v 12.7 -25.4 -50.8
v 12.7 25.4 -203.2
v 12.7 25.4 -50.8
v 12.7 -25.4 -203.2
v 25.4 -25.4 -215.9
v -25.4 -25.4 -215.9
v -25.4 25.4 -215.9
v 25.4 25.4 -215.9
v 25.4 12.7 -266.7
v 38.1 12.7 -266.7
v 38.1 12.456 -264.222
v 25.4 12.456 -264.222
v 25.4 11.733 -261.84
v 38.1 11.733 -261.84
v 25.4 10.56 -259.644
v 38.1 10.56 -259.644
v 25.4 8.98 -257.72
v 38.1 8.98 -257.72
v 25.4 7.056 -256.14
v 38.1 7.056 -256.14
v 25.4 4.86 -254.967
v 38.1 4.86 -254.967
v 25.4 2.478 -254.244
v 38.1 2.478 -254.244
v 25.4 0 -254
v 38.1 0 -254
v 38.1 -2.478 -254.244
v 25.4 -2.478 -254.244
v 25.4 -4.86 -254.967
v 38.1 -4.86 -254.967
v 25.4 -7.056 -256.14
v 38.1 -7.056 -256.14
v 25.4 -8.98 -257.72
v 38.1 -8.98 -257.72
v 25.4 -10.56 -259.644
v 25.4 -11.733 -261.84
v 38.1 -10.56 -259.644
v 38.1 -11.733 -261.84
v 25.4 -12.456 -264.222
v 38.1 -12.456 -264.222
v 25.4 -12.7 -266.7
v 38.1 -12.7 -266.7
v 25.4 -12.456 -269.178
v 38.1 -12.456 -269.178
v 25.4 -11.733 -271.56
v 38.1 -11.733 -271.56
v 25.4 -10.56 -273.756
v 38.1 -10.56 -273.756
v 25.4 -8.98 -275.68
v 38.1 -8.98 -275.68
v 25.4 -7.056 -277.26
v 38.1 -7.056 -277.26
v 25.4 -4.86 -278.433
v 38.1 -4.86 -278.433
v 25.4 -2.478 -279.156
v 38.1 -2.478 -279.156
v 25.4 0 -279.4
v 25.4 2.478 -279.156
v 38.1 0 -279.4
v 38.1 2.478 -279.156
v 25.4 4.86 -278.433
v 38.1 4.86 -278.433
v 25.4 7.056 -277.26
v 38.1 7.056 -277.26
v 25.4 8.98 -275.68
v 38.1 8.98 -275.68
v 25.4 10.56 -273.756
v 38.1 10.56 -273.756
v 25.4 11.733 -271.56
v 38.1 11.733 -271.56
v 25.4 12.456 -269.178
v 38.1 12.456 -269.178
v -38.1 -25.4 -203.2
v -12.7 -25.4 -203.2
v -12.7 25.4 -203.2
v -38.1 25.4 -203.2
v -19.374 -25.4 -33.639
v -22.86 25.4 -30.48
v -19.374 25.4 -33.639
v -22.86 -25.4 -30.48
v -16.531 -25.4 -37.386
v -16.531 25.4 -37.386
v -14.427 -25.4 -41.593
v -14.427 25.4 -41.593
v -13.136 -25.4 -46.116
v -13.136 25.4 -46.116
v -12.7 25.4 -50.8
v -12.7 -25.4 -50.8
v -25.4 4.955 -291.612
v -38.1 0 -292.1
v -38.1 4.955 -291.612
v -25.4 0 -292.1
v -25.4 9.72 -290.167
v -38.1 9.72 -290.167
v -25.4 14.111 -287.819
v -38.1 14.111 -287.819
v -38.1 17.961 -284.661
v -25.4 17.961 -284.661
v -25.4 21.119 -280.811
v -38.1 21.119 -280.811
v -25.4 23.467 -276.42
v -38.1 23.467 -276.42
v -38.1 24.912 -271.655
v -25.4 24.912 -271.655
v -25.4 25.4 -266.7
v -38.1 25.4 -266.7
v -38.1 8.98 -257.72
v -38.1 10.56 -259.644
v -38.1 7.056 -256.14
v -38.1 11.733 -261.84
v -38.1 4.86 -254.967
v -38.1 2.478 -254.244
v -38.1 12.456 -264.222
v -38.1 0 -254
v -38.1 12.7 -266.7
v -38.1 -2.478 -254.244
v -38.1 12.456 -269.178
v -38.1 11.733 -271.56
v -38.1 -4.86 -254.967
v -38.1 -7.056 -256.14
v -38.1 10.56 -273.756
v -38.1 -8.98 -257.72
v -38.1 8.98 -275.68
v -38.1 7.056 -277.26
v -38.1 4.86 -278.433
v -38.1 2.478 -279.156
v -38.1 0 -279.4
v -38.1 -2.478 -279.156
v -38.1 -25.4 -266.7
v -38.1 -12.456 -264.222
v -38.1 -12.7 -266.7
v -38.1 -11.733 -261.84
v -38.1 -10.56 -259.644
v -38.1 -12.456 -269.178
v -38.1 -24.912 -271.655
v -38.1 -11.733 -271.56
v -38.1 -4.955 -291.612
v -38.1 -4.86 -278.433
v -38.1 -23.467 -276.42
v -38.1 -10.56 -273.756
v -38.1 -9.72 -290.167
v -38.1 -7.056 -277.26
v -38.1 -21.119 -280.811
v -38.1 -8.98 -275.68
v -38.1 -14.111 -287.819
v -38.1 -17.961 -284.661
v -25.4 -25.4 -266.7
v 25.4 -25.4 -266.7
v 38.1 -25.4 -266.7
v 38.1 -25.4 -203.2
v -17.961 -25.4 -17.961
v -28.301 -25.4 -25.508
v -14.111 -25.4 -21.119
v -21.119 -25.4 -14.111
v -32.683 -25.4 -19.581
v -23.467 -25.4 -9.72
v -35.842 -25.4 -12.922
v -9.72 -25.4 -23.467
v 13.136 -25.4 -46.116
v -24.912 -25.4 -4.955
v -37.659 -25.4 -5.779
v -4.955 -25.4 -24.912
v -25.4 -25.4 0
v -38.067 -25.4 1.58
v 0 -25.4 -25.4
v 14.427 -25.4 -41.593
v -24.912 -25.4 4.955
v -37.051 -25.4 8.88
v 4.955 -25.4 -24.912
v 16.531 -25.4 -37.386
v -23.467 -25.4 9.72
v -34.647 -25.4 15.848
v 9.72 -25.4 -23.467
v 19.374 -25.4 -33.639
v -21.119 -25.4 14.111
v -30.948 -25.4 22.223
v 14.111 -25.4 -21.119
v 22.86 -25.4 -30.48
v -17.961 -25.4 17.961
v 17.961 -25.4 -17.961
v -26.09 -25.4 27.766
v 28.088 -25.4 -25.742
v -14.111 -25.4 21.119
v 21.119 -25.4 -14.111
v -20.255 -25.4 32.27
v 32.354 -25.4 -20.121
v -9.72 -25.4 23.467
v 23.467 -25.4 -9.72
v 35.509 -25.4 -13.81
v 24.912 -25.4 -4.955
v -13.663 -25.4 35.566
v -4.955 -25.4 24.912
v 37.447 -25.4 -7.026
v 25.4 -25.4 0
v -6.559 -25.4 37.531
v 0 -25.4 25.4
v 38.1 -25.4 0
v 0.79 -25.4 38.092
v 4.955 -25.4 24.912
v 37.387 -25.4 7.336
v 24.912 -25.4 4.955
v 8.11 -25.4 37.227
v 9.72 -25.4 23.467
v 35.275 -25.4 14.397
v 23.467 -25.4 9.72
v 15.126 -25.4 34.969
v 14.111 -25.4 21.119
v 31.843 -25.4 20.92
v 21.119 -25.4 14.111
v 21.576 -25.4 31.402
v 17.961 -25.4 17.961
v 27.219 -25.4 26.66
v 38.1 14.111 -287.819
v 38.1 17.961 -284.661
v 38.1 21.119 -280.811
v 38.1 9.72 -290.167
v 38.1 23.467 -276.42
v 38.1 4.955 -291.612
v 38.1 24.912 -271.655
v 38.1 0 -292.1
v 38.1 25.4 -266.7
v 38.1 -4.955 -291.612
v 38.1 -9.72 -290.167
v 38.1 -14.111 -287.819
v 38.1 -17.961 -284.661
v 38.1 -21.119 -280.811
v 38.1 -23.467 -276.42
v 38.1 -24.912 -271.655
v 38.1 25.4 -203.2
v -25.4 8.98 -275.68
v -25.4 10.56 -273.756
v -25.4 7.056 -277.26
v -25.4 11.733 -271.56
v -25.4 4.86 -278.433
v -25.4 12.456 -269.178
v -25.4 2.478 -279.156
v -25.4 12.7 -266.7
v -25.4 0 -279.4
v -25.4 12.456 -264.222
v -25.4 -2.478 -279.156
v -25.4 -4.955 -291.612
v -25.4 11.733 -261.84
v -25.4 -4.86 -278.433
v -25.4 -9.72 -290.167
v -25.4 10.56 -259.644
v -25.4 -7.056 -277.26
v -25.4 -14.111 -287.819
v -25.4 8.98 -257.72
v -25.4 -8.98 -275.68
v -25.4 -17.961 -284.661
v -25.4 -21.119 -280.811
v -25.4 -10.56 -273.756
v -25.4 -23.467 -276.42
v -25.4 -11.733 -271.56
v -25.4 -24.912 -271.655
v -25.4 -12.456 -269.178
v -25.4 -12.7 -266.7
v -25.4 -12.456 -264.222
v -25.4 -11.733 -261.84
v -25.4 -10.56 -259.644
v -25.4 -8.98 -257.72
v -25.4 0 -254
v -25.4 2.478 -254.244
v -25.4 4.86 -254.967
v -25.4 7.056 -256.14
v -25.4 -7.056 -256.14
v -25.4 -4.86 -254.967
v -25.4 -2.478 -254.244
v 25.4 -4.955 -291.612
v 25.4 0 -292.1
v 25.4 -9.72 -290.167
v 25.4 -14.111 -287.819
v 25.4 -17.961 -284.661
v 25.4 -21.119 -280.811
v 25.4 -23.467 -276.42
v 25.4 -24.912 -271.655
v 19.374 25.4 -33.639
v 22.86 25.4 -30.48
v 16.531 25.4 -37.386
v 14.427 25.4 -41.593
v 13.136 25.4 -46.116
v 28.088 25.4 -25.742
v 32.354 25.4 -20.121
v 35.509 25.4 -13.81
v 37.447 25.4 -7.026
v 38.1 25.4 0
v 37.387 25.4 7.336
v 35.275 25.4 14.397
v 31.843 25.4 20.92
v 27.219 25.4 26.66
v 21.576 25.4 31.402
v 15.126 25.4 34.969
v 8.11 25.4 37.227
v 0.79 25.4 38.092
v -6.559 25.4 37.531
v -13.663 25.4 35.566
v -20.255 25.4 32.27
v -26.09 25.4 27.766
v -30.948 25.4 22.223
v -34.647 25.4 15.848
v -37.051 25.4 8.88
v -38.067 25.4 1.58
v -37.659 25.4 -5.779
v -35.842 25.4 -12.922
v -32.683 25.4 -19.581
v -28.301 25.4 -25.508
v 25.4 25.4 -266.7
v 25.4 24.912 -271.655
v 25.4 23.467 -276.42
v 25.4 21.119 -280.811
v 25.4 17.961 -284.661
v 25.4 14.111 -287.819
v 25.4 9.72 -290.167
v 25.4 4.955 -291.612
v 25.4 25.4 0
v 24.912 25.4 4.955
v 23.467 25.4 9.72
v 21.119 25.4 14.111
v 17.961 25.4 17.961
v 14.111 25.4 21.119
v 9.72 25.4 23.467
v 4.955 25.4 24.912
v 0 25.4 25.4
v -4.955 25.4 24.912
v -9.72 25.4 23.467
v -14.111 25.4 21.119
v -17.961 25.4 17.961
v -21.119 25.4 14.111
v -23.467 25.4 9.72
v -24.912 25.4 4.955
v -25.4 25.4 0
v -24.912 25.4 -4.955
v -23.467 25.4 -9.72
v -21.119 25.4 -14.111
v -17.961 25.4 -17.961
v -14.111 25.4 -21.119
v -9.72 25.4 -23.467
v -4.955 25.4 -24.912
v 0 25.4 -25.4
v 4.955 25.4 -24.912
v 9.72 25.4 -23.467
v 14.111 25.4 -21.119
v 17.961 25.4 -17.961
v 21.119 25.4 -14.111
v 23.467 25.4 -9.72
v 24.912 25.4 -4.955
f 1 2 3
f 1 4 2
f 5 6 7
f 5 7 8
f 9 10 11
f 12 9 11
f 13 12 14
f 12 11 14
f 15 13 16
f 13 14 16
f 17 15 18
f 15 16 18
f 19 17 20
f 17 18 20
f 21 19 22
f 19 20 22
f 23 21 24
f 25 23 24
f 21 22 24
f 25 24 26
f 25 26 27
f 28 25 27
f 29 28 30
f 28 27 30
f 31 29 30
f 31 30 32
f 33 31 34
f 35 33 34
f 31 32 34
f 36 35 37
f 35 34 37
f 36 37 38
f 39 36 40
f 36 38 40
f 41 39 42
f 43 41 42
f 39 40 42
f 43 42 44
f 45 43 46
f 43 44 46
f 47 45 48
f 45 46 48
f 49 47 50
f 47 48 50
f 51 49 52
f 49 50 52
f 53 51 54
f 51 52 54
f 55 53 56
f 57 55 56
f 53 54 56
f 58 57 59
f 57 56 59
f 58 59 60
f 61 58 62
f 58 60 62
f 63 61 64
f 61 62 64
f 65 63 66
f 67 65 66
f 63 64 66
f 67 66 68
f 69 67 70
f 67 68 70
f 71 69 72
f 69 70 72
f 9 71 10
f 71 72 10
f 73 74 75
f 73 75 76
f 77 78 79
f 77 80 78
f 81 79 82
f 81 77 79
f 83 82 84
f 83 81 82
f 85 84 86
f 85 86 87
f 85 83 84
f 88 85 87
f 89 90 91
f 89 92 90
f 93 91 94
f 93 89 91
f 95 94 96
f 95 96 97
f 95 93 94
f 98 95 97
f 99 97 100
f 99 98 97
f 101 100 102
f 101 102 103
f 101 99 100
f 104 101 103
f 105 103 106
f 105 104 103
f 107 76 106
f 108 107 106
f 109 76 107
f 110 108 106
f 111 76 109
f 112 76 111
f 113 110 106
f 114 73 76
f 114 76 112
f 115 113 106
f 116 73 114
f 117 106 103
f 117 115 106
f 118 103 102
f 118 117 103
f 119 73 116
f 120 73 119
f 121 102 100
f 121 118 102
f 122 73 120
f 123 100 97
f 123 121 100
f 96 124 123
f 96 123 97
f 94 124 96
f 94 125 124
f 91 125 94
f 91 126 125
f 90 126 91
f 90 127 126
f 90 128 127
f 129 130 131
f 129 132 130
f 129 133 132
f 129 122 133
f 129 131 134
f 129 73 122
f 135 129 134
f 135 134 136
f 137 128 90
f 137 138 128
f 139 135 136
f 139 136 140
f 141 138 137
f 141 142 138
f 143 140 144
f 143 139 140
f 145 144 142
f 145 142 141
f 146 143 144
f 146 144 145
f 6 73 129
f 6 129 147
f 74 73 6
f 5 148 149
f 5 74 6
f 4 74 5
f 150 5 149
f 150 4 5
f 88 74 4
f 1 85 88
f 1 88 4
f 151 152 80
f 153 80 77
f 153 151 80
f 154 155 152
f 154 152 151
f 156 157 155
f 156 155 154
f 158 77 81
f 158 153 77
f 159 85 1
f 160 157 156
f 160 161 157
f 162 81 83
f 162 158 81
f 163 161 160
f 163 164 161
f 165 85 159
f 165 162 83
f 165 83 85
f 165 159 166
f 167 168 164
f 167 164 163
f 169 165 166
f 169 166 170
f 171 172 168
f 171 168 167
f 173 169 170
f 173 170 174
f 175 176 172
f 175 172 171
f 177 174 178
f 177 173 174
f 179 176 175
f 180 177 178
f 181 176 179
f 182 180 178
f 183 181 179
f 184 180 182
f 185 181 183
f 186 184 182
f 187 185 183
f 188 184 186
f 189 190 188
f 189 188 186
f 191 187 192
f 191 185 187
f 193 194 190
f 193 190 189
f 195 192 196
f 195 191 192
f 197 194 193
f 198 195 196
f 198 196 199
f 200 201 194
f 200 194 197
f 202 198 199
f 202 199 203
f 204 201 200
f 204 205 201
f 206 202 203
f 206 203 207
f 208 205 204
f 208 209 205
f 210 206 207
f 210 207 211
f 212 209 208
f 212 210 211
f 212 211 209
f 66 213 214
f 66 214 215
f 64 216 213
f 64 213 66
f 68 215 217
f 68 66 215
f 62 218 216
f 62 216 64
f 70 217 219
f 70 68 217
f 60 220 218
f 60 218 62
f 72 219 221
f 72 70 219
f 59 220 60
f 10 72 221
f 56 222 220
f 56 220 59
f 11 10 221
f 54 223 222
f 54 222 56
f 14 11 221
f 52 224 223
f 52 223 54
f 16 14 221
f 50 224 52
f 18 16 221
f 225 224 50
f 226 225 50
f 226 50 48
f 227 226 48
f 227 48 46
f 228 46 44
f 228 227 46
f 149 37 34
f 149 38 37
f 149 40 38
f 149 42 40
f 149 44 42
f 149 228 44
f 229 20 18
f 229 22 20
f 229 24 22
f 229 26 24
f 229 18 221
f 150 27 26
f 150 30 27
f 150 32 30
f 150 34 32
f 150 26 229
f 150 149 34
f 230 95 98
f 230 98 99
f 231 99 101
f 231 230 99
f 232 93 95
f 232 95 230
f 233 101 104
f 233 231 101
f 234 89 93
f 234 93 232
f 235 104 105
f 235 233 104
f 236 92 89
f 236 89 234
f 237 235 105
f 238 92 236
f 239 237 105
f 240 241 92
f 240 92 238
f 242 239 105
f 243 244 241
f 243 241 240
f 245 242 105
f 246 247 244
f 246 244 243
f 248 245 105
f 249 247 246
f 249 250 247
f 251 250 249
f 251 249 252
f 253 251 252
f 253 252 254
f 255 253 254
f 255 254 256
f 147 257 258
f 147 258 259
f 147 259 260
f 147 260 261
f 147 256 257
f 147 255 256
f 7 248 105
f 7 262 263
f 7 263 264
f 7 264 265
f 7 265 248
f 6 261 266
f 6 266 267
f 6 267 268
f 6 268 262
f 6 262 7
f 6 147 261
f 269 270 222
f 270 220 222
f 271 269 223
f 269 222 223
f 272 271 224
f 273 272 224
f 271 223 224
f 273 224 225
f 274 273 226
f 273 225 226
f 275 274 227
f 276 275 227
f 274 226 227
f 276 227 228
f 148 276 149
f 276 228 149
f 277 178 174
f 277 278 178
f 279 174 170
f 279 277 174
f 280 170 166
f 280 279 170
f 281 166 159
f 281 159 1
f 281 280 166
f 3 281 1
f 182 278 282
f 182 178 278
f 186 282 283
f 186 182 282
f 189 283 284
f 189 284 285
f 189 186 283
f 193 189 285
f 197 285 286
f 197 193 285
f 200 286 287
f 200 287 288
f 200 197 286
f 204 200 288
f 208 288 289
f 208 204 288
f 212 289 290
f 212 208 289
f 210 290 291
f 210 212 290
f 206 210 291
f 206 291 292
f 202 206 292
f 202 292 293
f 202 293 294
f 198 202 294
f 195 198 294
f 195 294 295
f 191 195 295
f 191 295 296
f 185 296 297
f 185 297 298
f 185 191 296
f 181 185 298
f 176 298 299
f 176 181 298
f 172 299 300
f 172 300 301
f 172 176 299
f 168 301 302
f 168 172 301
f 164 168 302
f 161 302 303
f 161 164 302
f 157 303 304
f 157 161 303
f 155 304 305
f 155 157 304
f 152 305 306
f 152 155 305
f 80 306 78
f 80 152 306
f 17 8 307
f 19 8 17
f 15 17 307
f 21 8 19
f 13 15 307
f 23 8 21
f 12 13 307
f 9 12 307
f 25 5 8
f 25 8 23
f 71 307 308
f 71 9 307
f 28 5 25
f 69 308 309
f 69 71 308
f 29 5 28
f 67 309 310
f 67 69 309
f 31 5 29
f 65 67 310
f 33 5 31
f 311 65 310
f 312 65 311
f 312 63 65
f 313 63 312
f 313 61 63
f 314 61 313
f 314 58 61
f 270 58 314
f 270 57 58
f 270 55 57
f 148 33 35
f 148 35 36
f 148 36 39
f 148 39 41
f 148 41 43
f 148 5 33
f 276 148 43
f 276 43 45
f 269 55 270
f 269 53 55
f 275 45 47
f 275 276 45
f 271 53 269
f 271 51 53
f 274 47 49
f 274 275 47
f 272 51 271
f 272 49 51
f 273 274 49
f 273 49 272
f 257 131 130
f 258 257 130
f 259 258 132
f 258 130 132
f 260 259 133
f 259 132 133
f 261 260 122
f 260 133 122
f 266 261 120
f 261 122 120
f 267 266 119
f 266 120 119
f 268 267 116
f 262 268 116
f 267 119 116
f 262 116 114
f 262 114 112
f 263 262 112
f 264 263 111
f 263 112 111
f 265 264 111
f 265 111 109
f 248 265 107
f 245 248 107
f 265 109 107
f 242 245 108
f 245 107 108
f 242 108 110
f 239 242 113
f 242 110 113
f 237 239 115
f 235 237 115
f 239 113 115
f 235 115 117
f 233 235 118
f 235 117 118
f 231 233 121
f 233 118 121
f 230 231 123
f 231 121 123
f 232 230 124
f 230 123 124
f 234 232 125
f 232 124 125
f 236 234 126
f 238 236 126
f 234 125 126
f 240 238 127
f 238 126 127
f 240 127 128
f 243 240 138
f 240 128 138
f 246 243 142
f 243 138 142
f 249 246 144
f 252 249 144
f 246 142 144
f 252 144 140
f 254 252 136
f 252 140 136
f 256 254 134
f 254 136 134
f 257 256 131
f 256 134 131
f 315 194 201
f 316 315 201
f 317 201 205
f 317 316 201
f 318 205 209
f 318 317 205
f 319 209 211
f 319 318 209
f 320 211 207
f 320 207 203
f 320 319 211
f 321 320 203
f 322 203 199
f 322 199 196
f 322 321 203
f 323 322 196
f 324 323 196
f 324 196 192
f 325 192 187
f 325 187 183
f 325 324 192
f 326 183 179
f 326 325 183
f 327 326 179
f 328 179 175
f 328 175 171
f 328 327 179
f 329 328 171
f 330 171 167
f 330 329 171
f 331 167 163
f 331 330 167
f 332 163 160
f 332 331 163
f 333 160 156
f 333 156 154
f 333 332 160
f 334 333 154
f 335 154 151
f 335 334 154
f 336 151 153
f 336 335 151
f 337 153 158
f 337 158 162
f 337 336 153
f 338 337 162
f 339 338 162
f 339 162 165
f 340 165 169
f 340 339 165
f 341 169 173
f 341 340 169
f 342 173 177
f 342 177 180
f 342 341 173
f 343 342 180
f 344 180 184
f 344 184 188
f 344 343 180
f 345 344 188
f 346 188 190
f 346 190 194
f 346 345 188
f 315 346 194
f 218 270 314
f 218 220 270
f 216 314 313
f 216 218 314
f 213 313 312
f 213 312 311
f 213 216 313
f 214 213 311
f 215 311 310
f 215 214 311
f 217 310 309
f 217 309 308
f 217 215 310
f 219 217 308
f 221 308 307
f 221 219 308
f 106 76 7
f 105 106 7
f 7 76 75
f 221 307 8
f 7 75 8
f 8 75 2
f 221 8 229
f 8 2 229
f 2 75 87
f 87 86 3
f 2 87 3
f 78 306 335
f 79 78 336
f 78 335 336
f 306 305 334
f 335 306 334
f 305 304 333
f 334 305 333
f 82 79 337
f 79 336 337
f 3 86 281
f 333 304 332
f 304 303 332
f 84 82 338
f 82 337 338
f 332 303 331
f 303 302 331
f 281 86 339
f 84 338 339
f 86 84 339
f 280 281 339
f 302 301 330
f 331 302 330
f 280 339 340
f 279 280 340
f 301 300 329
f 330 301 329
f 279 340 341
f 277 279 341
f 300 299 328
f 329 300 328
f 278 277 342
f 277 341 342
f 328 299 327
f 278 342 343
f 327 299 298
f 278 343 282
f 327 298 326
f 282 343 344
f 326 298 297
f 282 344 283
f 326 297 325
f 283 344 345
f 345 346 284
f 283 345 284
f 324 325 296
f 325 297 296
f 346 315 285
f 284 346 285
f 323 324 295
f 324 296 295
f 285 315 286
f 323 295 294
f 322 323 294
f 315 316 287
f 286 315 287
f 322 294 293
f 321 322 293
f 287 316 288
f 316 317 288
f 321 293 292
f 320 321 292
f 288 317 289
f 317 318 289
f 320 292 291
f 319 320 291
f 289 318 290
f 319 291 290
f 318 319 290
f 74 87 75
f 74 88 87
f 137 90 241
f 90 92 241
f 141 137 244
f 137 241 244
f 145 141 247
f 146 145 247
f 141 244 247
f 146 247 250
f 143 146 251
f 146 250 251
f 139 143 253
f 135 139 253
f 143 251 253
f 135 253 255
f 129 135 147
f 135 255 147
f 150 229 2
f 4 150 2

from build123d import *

# Parameters (mm, degrees)
F0_R     = 25.4
F1_DEPTH = 25.4
F2_R     = 25.39999
F3_R     = 12.7
F4_DEPTH = 12.7
F5_R     = 12.7
F6_DEPTH = 12.7


# Not quite as in the source:
# - a fillet or chamfer is up to 0.001 mm smaller than in the source, because OpenCascade refuses the exact size


with BuildPart() as f1:
    # F0 (on Front) → F1 (new body, symmetric)
    with BuildSketch(Plane.XZ):
        with BuildLine():
            ThreePointArc((12.7, -35.9210244843), (31.1085197333, -21.9970452561), (38.1, 0))
            ThreePointArc((38.1, 0), (-21.9970452561, 31.1085197333), (-12.7, -35.9210244843))
            ThreePointArc((-12.7, -35.9210244843), (0, -38.1), (12.7, -35.9210244843))
        make_face()
        Circle(F0_R, mode=Mode.SUBTRACT)
        with BuildLine():
            ThreePointArc((12.7, -35.9210244843), (0, -38.1), (-12.7, -35.9210244843))
            Line((-12.7, -35.9210244843), (-12.7, -203.2))
            Line((-12.7, -203.2), (-38.1, -203.2))
            Line((-38.1, -203.2), (-38.1, -292.1))
            Line((-38.1, -292.1), (-25.4, -292.1))
            Line((-25.4, -292.1), (-25.4, -215.9))
            Line((-25.4, -215.9), (25.4, -215.9))
            Line((25.4, -215.9), (25.4, -292.1))
            Line((25.4, -292.1), (38.1, -292.1))
            Line((38.1, -292.1), (38.1, -203.2))
            Line((38.1, -203.2), (12.7, -203.2))
            Line((12.7, -203.2), (12.7, -35.9210244843))
        make_face()
    extrude(amount=F1_DEPTH, both=True)

    # F2 (radius 25.4 in the source; OpenCascade refuses exactly that, so slightly less here)
    f2_edges = [f1.edges().sort_by_distance(p)[0] for p in [
        (12.7, 0, -35.921024),
        (-12.7, 0, -35.921024),
        (-31.75, -25.4, -292.1),
        (-31.75, 25.4, -292.1),
        (31.75, -25.4, -292.1),
        (31.75, 25.4, -292.1),
    ]]
    fillet(f2_edges, radius=F2_R)

    # F3 (on face) → F4 (cut, through all)
    with BuildSketch(Plane(origin=(-38.1, 0, 0), x_dir=(0, -1, 0), z_dir=(-1, 0, 0))):
        with Locations((0, -266.7)):
            Circle(F3_R)
    extrude(amount=-F4_DEPTH, mode=Mode.SUBTRACT)

    # F5 (on face) → F6 (cut, through all)
    with BuildSketch(Plane.YZ.offset(38.1)):
        with Locations((0, -266.7)):
            Circle(F5_R)
    extrude(amount=-F6_DEPTH, mode=Mode.SUBTRACT)


solid = f1.part
